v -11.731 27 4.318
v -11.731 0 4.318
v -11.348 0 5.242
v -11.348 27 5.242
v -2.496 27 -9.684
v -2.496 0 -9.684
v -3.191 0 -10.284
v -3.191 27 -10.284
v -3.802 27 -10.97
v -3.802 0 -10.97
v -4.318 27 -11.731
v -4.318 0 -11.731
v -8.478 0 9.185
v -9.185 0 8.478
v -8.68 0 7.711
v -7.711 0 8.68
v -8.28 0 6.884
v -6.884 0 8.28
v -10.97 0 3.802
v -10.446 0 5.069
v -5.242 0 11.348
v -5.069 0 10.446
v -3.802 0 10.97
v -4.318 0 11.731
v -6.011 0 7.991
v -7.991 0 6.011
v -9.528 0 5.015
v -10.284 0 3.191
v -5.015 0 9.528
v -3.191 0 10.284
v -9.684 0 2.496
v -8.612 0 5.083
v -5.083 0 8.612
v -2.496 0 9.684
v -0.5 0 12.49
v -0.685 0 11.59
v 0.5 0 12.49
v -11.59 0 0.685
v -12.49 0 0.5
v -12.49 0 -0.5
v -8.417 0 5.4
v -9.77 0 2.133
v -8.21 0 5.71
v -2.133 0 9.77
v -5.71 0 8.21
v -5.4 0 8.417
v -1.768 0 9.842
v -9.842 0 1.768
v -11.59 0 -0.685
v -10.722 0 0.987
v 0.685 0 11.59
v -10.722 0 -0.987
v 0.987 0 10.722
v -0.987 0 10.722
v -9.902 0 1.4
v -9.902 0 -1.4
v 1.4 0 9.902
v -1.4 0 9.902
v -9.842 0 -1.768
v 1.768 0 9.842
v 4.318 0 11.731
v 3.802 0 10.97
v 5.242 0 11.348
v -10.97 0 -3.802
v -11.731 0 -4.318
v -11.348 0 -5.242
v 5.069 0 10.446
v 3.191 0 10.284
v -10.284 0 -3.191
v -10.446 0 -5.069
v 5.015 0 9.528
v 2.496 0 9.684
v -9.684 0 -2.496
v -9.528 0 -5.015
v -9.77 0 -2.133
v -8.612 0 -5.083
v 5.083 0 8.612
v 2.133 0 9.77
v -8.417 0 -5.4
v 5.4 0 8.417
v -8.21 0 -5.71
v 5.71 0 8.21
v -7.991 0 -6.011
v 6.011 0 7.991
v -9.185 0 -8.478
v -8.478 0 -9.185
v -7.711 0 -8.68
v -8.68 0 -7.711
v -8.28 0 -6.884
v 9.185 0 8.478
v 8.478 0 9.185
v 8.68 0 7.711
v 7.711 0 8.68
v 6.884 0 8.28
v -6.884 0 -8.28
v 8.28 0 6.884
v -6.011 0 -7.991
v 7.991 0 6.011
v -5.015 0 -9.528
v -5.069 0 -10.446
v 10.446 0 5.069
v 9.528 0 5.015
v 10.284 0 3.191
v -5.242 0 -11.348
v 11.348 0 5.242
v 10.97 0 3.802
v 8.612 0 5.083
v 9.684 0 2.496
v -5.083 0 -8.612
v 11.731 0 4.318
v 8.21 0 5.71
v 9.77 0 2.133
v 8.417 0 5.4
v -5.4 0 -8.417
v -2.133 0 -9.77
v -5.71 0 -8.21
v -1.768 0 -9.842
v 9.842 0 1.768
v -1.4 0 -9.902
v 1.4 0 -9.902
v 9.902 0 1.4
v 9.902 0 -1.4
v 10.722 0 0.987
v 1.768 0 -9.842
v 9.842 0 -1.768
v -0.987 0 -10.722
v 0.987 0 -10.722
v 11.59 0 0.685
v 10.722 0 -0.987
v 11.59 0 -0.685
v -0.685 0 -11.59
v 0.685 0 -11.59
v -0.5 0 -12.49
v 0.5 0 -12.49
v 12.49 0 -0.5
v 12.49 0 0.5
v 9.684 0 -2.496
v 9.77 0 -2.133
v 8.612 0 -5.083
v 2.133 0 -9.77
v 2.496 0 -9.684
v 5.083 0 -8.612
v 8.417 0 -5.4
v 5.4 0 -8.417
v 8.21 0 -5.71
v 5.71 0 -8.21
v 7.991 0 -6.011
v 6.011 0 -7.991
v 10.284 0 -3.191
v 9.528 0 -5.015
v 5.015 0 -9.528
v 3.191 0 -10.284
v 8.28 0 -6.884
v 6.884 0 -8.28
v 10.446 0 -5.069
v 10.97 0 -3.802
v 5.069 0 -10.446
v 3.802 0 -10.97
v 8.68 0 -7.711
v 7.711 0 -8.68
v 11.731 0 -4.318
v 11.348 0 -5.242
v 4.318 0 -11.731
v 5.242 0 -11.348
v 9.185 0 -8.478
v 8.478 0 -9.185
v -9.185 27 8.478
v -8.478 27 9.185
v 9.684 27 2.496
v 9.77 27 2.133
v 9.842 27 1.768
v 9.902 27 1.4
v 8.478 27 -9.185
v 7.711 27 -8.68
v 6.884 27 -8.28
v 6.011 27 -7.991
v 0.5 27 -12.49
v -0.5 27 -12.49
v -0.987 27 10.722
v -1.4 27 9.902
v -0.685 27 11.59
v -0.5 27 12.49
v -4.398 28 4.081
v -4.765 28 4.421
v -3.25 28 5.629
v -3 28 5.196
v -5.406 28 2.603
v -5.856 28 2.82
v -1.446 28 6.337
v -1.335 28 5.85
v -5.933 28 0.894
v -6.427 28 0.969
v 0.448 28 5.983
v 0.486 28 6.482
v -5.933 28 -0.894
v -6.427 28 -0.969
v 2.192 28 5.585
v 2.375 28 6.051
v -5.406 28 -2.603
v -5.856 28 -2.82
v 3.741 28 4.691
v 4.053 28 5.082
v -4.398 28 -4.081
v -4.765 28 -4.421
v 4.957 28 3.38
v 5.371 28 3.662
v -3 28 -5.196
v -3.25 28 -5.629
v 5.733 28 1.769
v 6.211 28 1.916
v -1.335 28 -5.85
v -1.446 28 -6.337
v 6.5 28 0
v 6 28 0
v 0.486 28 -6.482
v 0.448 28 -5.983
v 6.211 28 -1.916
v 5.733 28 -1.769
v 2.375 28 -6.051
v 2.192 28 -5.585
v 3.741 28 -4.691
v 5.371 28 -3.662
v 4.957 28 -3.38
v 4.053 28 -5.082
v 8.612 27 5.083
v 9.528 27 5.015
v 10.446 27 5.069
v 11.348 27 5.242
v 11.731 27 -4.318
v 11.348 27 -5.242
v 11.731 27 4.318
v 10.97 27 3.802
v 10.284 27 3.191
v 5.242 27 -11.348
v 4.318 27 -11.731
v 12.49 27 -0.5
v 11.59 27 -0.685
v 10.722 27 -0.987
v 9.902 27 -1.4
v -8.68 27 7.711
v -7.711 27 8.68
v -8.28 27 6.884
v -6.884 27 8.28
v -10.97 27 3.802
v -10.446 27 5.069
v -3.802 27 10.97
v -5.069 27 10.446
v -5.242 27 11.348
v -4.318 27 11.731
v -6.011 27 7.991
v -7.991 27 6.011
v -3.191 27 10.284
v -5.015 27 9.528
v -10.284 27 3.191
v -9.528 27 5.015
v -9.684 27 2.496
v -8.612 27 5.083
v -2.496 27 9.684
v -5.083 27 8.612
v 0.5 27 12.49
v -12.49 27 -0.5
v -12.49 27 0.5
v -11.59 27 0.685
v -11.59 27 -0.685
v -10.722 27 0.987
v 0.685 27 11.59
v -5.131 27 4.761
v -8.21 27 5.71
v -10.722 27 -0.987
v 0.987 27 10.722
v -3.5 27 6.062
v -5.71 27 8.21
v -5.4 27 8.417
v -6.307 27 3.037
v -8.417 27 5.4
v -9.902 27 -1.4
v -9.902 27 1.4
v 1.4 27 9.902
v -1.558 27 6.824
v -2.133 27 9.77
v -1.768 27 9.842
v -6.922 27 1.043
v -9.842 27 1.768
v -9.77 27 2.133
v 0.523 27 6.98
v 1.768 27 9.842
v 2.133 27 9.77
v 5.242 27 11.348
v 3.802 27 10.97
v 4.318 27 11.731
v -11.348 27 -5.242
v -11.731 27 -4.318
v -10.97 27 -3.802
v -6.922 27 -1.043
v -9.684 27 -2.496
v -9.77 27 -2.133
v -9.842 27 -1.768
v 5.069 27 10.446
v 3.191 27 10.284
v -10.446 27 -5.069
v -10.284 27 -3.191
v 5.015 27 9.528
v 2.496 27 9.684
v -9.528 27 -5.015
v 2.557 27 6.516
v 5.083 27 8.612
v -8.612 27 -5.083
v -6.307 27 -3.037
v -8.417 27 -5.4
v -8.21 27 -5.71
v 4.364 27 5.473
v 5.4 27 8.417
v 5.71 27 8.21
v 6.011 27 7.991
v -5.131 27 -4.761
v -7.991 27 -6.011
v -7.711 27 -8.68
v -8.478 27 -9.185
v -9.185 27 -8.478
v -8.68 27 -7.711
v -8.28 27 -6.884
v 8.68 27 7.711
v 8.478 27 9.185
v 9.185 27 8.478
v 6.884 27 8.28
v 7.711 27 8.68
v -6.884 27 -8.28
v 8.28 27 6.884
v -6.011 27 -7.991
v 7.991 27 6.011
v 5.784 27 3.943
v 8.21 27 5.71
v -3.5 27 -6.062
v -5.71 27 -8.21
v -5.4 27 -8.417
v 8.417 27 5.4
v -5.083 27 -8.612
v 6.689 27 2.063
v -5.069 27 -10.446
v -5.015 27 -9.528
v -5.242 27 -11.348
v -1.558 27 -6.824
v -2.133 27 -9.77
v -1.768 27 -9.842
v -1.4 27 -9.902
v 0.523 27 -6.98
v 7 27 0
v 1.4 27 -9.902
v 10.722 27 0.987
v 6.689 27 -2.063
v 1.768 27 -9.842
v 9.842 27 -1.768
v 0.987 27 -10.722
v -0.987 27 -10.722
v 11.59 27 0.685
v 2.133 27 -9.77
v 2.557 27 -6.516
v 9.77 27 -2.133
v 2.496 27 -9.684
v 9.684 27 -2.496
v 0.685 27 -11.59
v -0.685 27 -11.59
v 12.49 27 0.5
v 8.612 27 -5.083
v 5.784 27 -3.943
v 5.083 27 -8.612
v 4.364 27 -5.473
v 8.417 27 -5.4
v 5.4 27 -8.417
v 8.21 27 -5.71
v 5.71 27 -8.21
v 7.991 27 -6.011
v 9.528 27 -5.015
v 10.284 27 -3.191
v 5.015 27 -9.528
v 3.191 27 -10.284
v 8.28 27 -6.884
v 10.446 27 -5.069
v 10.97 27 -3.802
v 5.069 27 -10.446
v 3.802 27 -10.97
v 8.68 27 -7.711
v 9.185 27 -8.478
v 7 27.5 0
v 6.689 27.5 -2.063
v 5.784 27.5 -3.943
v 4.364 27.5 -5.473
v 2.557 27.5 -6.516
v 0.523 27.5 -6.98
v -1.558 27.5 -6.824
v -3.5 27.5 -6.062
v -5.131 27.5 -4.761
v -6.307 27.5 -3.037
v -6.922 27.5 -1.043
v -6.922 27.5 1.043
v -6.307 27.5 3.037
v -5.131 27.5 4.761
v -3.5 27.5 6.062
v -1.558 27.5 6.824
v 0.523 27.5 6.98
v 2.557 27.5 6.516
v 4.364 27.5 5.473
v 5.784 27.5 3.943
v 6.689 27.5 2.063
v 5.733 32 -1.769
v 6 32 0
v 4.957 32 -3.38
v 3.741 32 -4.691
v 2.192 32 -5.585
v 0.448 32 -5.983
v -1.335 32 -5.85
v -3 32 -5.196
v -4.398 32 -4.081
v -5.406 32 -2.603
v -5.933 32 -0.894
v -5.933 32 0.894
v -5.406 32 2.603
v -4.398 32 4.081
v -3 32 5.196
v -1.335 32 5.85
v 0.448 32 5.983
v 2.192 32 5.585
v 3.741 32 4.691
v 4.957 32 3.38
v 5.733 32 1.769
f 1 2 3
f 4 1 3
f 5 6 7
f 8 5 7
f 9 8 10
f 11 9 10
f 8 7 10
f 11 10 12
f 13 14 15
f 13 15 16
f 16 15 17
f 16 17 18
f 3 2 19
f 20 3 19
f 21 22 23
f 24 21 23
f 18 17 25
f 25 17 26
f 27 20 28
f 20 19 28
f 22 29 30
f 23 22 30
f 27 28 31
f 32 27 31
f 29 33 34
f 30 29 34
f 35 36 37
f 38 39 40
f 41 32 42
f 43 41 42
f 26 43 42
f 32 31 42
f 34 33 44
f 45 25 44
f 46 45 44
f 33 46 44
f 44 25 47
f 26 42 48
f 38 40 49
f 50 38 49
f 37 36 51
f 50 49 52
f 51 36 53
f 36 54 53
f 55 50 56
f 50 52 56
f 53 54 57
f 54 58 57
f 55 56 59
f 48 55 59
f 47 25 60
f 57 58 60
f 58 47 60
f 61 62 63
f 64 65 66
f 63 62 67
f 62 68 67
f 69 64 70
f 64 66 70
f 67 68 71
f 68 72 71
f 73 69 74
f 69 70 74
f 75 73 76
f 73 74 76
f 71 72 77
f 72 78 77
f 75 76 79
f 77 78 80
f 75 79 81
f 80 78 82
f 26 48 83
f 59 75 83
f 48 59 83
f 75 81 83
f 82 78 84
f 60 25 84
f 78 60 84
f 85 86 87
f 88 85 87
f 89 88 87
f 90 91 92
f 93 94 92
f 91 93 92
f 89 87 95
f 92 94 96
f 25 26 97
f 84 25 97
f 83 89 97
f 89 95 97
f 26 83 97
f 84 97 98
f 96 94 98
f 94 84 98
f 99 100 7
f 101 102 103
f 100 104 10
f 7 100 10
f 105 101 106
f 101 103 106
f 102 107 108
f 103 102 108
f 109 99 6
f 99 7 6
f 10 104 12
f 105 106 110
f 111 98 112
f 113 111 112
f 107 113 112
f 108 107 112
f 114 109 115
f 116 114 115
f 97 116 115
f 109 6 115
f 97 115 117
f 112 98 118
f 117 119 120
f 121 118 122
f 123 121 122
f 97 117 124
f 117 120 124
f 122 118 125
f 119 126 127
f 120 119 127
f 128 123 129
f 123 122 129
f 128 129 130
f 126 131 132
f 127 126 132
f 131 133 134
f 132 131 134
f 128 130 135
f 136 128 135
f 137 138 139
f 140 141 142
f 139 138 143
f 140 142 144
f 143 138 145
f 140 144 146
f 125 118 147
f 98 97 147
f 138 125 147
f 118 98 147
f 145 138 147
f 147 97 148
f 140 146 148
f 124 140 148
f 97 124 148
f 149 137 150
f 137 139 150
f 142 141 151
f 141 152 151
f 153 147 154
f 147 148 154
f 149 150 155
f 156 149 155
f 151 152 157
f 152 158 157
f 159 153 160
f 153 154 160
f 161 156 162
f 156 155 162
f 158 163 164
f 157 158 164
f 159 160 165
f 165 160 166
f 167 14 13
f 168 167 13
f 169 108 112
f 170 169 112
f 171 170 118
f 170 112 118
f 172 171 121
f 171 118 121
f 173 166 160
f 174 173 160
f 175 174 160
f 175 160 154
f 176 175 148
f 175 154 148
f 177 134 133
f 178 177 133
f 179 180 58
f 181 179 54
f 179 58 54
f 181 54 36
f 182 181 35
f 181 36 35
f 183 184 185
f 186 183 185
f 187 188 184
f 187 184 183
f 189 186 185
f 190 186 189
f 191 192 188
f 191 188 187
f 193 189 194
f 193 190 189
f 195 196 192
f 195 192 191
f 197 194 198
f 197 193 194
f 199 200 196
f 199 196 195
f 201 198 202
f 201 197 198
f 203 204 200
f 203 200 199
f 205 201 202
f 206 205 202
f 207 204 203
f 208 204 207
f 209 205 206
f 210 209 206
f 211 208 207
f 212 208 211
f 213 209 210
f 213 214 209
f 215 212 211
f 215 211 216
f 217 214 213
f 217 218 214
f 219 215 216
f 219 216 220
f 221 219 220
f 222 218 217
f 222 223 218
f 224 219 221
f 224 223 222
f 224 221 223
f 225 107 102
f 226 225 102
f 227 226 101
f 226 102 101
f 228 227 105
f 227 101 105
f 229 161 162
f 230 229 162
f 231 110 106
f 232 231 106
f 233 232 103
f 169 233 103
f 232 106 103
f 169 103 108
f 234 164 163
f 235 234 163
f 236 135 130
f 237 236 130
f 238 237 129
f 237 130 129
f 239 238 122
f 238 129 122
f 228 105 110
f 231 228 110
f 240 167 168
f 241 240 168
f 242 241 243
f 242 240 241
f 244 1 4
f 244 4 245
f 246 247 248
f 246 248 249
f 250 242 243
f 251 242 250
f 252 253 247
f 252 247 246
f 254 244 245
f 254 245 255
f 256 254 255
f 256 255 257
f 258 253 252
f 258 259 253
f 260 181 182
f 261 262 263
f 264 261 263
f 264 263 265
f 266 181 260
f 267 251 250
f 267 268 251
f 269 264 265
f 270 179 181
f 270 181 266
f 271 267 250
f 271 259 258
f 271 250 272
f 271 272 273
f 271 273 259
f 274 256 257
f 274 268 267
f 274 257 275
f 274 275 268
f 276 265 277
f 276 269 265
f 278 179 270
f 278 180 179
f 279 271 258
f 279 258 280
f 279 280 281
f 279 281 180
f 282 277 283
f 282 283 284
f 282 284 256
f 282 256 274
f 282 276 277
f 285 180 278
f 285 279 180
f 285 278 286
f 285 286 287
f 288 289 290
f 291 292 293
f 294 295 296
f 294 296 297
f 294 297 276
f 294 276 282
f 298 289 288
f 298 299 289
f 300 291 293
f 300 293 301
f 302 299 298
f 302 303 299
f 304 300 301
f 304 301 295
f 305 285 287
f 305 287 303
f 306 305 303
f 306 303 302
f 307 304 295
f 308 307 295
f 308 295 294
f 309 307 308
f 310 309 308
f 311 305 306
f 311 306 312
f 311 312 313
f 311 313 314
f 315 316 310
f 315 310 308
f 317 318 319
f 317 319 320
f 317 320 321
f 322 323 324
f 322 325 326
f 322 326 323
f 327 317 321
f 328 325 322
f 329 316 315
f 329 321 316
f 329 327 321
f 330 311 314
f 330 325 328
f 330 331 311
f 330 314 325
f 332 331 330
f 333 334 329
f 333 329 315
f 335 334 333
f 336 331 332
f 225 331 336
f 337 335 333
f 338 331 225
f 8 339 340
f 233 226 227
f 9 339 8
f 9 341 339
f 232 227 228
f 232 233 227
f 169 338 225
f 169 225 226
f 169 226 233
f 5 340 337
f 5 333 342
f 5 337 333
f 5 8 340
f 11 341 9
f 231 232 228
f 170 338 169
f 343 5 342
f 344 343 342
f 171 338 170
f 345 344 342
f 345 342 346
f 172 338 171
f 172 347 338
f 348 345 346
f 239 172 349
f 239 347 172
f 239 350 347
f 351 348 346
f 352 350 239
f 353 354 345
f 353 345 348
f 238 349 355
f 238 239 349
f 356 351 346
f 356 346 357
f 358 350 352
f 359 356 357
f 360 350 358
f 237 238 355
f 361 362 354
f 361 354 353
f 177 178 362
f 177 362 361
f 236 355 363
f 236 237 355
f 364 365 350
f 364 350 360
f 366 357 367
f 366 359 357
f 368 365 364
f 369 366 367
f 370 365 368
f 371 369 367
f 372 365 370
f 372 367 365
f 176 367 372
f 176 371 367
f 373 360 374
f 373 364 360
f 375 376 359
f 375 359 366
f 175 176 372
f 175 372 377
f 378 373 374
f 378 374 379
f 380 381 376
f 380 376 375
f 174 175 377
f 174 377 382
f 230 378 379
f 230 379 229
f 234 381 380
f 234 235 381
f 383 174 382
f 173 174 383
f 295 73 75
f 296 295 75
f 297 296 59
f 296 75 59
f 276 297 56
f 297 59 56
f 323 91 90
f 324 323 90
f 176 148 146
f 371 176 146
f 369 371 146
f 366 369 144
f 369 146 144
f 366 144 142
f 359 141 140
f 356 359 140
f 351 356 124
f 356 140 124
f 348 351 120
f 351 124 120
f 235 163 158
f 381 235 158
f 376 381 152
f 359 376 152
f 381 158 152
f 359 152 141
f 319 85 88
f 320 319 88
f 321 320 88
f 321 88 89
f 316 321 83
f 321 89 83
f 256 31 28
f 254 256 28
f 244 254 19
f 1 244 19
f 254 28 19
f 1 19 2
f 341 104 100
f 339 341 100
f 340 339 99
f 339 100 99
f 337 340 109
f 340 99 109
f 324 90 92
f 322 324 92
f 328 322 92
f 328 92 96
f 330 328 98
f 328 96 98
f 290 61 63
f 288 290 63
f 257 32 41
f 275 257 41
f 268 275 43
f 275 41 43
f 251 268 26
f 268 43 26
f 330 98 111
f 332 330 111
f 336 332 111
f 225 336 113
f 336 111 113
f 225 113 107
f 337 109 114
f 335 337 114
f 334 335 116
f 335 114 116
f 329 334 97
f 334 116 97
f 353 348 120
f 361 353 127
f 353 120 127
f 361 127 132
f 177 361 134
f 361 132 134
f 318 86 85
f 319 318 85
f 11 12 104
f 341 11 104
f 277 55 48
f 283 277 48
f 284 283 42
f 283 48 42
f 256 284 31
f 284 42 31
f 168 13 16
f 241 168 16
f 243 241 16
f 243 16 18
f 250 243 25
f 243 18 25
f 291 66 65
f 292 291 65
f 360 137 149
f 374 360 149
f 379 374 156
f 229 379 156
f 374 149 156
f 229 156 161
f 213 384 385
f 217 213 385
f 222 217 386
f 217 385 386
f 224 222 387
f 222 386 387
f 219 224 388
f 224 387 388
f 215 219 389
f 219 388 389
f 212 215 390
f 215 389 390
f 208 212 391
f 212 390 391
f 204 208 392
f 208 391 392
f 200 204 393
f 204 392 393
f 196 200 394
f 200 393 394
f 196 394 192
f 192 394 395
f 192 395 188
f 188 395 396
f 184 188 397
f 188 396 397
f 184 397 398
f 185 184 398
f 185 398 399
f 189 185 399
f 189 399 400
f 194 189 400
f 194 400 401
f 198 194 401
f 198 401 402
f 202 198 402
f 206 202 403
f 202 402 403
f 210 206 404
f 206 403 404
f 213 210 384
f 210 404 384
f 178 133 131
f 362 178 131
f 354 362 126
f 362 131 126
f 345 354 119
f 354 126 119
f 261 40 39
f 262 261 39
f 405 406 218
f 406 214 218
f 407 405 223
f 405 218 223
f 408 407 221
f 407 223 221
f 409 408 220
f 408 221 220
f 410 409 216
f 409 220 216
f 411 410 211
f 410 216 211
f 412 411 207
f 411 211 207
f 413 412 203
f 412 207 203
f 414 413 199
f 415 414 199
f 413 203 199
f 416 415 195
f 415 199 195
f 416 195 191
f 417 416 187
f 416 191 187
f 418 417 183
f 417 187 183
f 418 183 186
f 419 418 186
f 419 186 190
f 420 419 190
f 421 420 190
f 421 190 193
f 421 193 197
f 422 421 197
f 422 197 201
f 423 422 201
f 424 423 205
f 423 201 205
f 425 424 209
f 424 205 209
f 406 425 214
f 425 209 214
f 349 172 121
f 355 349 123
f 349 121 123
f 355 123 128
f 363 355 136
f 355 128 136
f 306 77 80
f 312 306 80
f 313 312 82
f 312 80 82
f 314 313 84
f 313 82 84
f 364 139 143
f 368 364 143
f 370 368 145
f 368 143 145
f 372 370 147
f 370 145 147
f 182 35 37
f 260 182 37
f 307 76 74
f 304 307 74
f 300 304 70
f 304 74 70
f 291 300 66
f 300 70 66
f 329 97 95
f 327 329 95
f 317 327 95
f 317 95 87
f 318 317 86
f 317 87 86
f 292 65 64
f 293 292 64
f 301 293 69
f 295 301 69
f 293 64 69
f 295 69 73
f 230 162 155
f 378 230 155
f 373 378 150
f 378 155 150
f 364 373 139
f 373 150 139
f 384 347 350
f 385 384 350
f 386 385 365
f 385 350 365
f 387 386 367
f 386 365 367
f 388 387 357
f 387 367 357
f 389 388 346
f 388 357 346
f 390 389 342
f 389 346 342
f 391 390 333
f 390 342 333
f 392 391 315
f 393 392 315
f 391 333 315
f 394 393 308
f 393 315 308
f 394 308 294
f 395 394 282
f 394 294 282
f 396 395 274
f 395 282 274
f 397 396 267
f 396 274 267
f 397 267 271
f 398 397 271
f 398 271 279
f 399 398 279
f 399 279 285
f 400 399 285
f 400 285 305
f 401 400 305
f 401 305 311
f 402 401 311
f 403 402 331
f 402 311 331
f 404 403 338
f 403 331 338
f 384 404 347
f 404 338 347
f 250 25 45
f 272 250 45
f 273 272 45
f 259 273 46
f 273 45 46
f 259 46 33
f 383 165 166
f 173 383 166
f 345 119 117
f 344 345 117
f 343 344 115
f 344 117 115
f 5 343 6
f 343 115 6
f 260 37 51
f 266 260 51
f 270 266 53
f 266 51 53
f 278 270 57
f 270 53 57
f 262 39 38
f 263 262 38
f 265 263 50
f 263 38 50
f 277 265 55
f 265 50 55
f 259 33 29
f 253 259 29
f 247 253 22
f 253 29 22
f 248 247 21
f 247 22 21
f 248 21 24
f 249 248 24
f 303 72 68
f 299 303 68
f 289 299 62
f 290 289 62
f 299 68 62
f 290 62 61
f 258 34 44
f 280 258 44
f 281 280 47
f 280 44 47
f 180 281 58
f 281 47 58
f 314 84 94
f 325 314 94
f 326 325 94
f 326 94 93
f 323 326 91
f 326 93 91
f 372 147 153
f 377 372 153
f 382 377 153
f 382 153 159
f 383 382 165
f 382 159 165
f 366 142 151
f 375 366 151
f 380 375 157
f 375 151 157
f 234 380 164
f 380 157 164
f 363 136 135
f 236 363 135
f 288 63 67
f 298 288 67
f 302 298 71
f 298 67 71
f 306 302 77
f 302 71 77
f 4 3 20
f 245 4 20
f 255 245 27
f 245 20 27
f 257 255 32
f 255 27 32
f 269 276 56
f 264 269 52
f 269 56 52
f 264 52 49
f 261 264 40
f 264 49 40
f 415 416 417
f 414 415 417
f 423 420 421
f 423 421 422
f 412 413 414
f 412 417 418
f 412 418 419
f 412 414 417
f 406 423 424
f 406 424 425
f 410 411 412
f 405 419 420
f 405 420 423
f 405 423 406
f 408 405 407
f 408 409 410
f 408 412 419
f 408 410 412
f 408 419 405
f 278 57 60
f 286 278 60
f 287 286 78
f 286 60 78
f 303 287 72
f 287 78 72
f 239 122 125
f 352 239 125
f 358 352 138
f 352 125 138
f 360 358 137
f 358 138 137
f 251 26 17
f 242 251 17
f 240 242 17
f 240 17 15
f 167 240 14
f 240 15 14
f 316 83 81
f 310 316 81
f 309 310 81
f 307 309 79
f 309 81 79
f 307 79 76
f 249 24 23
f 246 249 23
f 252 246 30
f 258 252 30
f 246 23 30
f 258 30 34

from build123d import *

# Parameters (mm, degrees)
BOSS_EXTRUDE1_DEPTH = 27
SKETCH2_R           = 6
BOSS_EXTRUDE2_DEPTH = 4
SKETCH4_R           = 7
BOSS_EXTRUDE3_DEPTH = 1
SKETCH5_R           = 6
BOSS_EXTRUDE4_DEPTH = 1
CHAMFER1_SIZE       = 0.5


with BuildPart() as part:
    # Sketch1 → Boss-Extrude1 (new body)
    with BuildSketch(Plane(origin=(0, 0, 0), x_dir=(1, 0, 0), z_dir=(0, 1, 0))):
        with BuildLine():
            Line((0.5, 12.489995997), (-0.5, 12.489995997))
            ThreePointArc((-0.5, 12.489995997), (-0.822089844, 11.151281888), (-1.4, 9.901515036))
            ThreePointArc((-1.4, 9.901515036), (-1.95090322, 9.807852804), (-2.495714414, 9.683563888))
            ThreePointArc((-2.495714414, 9.683563888), (-3.507898848, 10.61704126), (-4.317774772, 11.730593379))
            Line((-4.317774772, 11.730593379), (-5.241654305, 11.347909946))
            ThreePointArc((-5.241654305, 11.347909946), (-5.026922808, 9.987840934), (-5.082577105, 8.612050277))
            ThreePointArc((-5.082577105, 8.612050277), (-5.55570233, 8.314696123), (-6.011478932, 7.991377919))
            ThreePointArc((-6.011478932, 7.991377919), (-7.303841738, 8.466452345), (-8.478207476, 9.185314257))
            Line((-8.478207476, 9.185314257), (-9.185314257, 8.478207476))
            ThreePointArc((-9.185314257, 8.478207476), (-8.466452345, 7.303841738), (-7.991377919, 6.011478932))
            ThreePointArc((-7.991377919, 6.011478932), (-8.314696123, 5.55570233), (-8.612050277, 5.082577105))
            ThreePointArc((-8.612050277, 5.082577105), (-9.987840934, 5.026922808), (-11.347909946, 5.241654305))
            Line((-11.347909946, 5.241654305), (-11.730593379, 4.317774772))
            ThreePointArc((-11.730593379, 4.317774772), (-10.61704126, 3.507898848), (-9.683563888, 2.495714414))
            ThreePointArc((-9.683563888, 2.495714414), (-9.807852804, 1.95090322), (-9.901515036, 1.4))
            ThreePointArc((-9.901515036, 1.4), (-11.151281888, 0.822089844), (-12.489995997, 0.5))
            Line((-12.489995997, 0.5), (-12.489995997, -0.5))
            ThreePointArc((-12.489995997, -0.5), (-11.151281888, -0.822089844), (-9.901515036, -1.4))
            ThreePointArc((-9.901515036, -1.4), (-9.807852804, -1.95090322), (-9.683563888, -2.495714414))
            ThreePointArc((-9.683563888, -2.495714414), (-10.61704126, -3.507898848), (-11.730593379, -4.317774772))
            Line((-11.730593379, -4.317774772), (-11.347909946, -5.241654305))
            ThreePointArc((-11.347909946, -5.241654305), (-9.987840934, -5.026922808), (-8.612050277, -5.082577105))
            ThreePointArc((-8.612050277, -5.082577105), (-8.314696123, -5.55570233), (-7.991377919, -6.011478932))
            ThreePointArc((-7.991377919, -6.011478932), (-8.466452345, -7.303841738), (-9.185314257, -8.478207476))
            Line((-9.185314257, -8.478207476), (-8.478207476, -9.185314257))
            ThreePointArc((-8.478207476, -9.185314257), (-7.303841738, -8.466452345), (-6.011478932, -7.991377919))
            ThreePointArc((-6.011478932, -7.991377919), (-5.55570233, -8.314696123), (-5.082577105, -8.612050277))
            ThreePointArc((-5.082577105, -8.612050277), (-5.026922808, -9.987840934), (-5.241654305, -11.347909946))
            Line((-5.241654305, -11.347909946), (-4.317774772, -11.730593379))
            ThreePointArc((-4.317774772, -11.730593379), (-3.507898848, -10.61704126), (-2.495714414, -9.683563888))
            ThreePointArc((-2.495714414, -9.683563888), (-1.95090322, -9.807852804), (-1.4, -9.901515036))
            ThreePointArc((-1.4, -9.901515036), (-0.822089844, -11.151281888), (-0.5, -12.489995997))
            Line((-0.5, -12.489995997), (0.5, -12.489995997))
            ThreePointArc((0.5, -12.489995997), (0.822089844, -11.151281888), (1.4, -9.901515036))
            ThreePointArc((1.4, -9.901515036), (1.95090322, -9.807852804), (2.495714414, -9.683563888))
            ThreePointArc((2.495714414, -9.683563888), (3.507898848, -10.61704126), (4.317774772, -11.730593379))
            Line((4.317774772, -11.730593379), (5.241654305, -11.347909946))
            ThreePointArc((5.241654305, -11.347909946), (5.026922808, -9.987840934), (5.082577105, -8.612050277))
            ThreePointArc((5.082577105, -8.612050277), (5.55570233, -8.314696123), (6.011478932, -7.991377919))
            ThreePointArc((6.011478932, -7.991377919), (7.303841738, -8.466452345), (8.478207476, -9.185314257))
            Line((8.478207476, -9.185314257), (9.185314257, -8.478207476))
            ThreePointArc((9.185314257, -8.478207476), (8.466452345, -7.303841738), (7.991377919, -6.011478932))
            ThreePointArc((7.991377919, -6.011478932), (8.314696123, -5.55570233), (8.612050277, -5.082577105))
            ThreePointArc((8.612050277, -5.082577105), (9.987840934, -5.026922808), (11.347909946, -5.241654305))
            Line((11.347909946, -5.241654305), (11.730593379, -4.317774772))
            ThreePointArc((11.730593379, -4.317774772), (10.61704126, -3.507898848), (9.683563888, -2.495714414))
            ThreePointArc((9.683563888, -2.495714414), (9.807852804, -1.95090322), (9.901515036, -1.4))
            ThreePointArc((9.901515036, -1.4), (11.151281888, -0.822089844), (12.489995997, -0.5))
            Line((12.489995997, -0.5), (12.489995997, 0.5))
            ThreePointArc((12.489995997, 0.5), (11.151281888, 0.822089844), (9.901515036, 1.4))
            ThreePointArc((9.901515036, 1.4), (9.807852804, 1.95090322), (9.683563888, 2.495714414))
            ThreePointArc((9.683563888, 2.495714414), (10.61704126, 3.507898848), (11.730593379, 4.317774772))
            Line((11.730593379, 4.317774772), (11.347909946, 5.241654305))
            ThreePointArc((11.347909946, 5.241654305), (9.987840934, 5.026922808), (8.612050277, 5.082577105))
            ThreePointArc((8.612050277, 5.082577105), (8.314696123, 5.55570233), (7.991377919, 6.011478932))
            ThreePointArc((7.991377919, 6.011478932), (8.466452345, 7.303841738), (9.185314257, 8.478207476))
            Line((9.185314257, 8.478207476), (8.478207476, 9.185314257))
            ThreePointArc((8.478207476, 9.185314257), (7.303841738, 8.466452345), (6.011478932, 7.991377919))
            ThreePointArc((6.011478932, 7.991377919), (5.55570233, 8.314696123), (5.082577105, 8.612050277))
            ThreePointArc((5.082577105, 8.612050277), (5.026922808, 9.987840934), (5.241654305, 11.347909946))
            Line((5.241654305, 11.347909946), (4.317774772, 11.730593379))
            ThreePointArc((4.317774772, 11.730593379), (3.507898848, 10.61704126), (2.495714414, 9.683563888))
            ThreePointArc((2.495714414, 9.683563888), (1.95090322, 9.807852804), (1.4, 9.901515036))
            ThreePointArc((1.4, 9.901515036), (0.822089844, 11.151281888), (0.5, 12.489995997))
        make_face()
    extrude(amount=BOSS_EXTRUDE1_DEPTH)

    # Sketch2 → Boss-Extrude2 (add)
    with BuildSketch(Plane(origin=(0, 27, 0), x_dir=(1, 0, 0), z_dir=(0, 1, 0))):
        Circle(SKETCH2_R)
    extrude(amount=BOSS_EXTRUDE2_DEPTH)

    # Sketch4 → Boss-Extrude3 (add)
    with BuildSketch(Plane(origin=(0, 27, 0), x_dir=(1, 0, 0), z_dir=(0, 1, 0))):
        Circle(SKETCH4_R)
    extrude(amount=BOSS_EXTRUDE3_DEPTH)

    # Sketch5 → Boss-Extrude4 (add)
    with BuildSketch(Plane(origin=(0, 31, 0), x_dir=(1, 0, 0), z_dir=(0, 1, 0))):
        Circle(SKETCH5_R)
    extrude(amount=BOSS_EXTRUDE4_DEPTH)

    # Chamfer1
    chamfer1_edges = [part.edges().sort_by_distance(p)[0] for p in [
        (-7, 28, 0),
    ]]
    chamfer(chamfer1_edges, length=CHAMFER1_SIZE)


solid = part.part
